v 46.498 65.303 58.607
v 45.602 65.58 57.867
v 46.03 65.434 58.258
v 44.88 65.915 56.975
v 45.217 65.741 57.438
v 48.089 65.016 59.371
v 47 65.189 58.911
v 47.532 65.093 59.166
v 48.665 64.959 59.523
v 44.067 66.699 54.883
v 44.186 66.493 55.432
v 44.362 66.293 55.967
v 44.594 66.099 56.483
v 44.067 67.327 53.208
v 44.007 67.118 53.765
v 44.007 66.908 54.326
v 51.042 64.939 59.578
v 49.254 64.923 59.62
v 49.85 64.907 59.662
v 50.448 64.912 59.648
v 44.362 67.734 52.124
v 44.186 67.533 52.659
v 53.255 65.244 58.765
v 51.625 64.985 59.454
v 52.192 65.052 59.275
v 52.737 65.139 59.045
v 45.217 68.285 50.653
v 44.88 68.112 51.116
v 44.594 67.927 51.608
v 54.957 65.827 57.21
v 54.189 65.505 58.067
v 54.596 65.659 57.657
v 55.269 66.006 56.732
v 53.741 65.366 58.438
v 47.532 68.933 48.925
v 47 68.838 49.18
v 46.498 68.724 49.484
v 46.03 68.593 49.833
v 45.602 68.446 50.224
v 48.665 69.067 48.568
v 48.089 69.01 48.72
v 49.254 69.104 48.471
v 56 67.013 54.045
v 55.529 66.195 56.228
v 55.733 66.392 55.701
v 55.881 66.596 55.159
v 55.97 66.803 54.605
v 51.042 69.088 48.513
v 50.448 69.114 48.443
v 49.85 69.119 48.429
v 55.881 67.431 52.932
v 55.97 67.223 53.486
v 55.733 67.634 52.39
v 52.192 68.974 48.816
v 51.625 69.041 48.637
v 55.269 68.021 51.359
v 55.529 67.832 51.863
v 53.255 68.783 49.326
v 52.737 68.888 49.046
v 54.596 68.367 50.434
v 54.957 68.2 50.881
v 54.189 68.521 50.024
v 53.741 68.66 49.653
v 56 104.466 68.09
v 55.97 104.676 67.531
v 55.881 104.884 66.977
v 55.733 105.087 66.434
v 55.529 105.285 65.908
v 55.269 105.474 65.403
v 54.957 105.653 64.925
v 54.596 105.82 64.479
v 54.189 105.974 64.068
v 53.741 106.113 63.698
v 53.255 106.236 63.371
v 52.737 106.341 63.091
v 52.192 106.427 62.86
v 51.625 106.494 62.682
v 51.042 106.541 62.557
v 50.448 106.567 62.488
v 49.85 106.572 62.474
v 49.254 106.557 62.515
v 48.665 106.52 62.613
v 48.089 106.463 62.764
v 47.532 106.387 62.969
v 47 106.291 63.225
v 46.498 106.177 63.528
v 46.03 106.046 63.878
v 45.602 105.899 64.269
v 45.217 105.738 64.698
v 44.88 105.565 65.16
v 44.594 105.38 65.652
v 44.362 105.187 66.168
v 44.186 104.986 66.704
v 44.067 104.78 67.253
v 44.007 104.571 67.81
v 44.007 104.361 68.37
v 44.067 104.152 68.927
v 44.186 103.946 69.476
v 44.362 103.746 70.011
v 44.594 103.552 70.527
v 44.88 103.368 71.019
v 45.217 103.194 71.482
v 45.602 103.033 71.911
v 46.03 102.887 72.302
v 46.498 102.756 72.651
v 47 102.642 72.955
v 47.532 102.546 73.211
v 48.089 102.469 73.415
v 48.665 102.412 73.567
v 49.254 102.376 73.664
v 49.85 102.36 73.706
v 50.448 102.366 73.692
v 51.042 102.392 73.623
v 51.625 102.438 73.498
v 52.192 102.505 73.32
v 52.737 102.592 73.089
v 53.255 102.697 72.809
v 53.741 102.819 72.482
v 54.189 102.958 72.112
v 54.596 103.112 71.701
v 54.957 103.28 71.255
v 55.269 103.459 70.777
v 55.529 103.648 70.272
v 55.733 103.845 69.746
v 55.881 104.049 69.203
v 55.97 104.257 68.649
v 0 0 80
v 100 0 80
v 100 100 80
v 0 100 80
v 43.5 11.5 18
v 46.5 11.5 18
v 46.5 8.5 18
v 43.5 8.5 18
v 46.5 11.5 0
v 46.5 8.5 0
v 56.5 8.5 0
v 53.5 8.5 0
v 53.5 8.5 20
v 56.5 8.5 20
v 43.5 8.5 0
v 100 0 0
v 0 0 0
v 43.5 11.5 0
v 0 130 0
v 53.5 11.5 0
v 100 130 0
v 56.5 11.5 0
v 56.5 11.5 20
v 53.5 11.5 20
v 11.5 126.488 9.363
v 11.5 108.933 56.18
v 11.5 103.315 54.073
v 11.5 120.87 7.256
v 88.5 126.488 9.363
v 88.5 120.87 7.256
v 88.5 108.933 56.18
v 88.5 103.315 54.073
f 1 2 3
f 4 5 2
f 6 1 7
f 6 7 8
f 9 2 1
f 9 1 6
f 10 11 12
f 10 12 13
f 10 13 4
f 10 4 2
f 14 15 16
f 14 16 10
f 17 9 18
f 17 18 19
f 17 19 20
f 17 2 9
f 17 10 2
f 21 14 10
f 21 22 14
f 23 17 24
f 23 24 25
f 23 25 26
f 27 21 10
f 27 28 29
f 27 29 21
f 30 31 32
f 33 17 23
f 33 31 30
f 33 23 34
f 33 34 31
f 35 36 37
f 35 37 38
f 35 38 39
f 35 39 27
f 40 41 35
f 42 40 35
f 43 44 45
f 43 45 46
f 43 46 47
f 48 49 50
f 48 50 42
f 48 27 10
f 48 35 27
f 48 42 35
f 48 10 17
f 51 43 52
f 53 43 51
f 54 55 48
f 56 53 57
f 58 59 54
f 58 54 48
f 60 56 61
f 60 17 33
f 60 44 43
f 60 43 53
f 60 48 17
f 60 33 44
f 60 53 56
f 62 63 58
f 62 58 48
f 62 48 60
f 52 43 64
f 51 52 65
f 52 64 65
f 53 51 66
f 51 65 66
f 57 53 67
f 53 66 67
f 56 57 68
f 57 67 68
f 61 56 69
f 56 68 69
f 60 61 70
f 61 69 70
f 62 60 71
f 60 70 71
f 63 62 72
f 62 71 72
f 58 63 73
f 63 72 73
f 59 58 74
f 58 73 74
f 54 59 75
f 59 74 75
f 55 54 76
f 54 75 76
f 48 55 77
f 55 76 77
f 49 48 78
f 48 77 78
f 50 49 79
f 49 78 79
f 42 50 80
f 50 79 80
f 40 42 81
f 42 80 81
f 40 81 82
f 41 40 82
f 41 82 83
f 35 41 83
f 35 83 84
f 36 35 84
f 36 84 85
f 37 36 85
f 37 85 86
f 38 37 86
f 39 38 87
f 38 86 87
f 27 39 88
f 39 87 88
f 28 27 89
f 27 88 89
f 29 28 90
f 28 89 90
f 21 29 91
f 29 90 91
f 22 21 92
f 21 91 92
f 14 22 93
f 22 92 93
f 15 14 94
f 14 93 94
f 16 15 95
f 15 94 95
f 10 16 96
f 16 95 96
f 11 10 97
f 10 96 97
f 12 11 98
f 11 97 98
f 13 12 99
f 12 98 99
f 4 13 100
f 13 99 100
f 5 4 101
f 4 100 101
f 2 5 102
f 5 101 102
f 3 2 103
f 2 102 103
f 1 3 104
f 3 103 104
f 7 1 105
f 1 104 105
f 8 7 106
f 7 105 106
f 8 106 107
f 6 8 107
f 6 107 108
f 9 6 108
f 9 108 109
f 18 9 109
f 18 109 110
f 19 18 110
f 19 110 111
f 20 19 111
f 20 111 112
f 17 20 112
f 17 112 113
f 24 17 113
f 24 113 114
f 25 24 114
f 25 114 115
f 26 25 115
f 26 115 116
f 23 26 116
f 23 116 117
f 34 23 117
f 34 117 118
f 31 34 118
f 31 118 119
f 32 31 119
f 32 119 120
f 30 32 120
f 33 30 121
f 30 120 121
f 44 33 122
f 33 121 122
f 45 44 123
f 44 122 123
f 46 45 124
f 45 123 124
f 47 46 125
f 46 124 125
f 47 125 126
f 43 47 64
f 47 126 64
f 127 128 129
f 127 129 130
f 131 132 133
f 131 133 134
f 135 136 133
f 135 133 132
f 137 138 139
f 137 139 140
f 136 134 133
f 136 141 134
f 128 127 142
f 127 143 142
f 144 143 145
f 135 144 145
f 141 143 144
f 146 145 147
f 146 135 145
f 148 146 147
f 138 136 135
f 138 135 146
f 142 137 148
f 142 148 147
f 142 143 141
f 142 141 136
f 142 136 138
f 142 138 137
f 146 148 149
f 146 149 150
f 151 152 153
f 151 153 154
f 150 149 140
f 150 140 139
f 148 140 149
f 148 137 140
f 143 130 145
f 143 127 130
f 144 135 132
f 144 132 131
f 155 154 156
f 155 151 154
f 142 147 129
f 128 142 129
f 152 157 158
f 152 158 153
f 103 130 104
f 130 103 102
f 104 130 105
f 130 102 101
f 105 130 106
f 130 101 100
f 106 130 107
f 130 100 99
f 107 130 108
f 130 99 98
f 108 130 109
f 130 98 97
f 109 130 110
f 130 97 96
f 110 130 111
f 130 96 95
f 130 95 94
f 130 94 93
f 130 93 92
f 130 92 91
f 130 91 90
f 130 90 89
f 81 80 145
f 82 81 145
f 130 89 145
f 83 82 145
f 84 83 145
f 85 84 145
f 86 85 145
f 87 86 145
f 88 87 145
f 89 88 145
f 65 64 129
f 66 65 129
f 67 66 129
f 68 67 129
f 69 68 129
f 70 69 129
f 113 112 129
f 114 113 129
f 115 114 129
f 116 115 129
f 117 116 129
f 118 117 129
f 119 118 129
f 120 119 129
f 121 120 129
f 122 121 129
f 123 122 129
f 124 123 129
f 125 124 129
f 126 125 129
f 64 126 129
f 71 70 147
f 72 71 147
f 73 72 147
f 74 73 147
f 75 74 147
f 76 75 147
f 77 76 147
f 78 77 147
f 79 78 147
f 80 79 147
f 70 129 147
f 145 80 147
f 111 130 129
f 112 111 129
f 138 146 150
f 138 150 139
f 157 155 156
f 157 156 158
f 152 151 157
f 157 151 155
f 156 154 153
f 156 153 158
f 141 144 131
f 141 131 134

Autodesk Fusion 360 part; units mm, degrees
sketch "Sketch1" plane through (0, 0, 0) normal (0, 1, 0) x (1, 0, 0)
  line L0 (0, 0) -> (100, 0)
  line L1 (100, 0) -> (100, -80)
  line L2 (100, -80) -> (0, -80)
  line L3 (0, -80) -> (0, 0)
  dimension "d1" = 100
  dimension "d2" = 80
extrude "Extrude1" add sketch "Sketch1" along normal blind 130
sketch "Sketch2" plane through (100, 0, 0) normal (1, 0, 0) x (0, 0, -1)
  line L0 (-80, 0) -> (0, 0)
  line L1 (0, 0) -> (0, 130)
  line L2 (0, 130) -> (-80, 130)
  line L3 (-80, 130) -> (-80, 0)
  line L4 (-80, 130) -> (-80, 100)
  line L5 (-80, 100) -> (0, 130)
extrude "Extrude2" cut sketch "Sketch2" against normal blind 130 contours L2 L3 L4 L5
sketch "Sketch3" plane through (0, 113.9726, 42.7397) normal (0, 0.9363, 0.3511) x (1, 0, 0)
  line L0 (0, 45.646) -> (0, -39.794)
  line L1 (0, -39.794) -> (100, -39.794)
  line L2 (100, -39.794) -> (100, 45.646)
  line L3 (100, 45.646) -> (0, 45.646)
  line L4 (11.5, 35.646) -> (88.5, 35.646)
  line L5 (88.5, 35.646) -> (88.5, -14.354)
  line L6 (88.5, -14.354) -> (11.5, -14.354)
  line L7 (11.5, -14.354) -> (11.5, 35.646)
  circle A0 centre (50, -27.074) radius 6
  dimension "d7" = 50
  dimension "d8" = 77
  dimension "d9" = 11.5
  dimension "d10" = 19.8322
  dimension "d11" = 10
  dimension "d12" = 25.44
  dimension "d13" = 12.72
  dimension "d14" = 50
  dimension "d15" = 12
extrude "Extrude4" cut sketch "Sketch3" against normal blind 40 contours A0
extrude "Extrude3" cut sketch "Sketch3" against normal blind 6 contours L4 L5 L6 L7
sketch "Sketch4" plane through (0, 0, 0) normal (0, 0, -1) x (-1, 0, 0)
  line L0 (-100, 0) -> (0, 0)
  line L1 (0, 0) -> (0, 130)
  line L2 (0, 130) -> (-100, 130)
  line L3 (-100, 130) -> (-100, 0)
  line L4 (-56.5, 11.5) -> (-53.5, 11.5)
  line L5 (-53.5, 11.5) -> (-53.5, 8.5)
  line L6 (-53.5, 8.5) -> (-56.5, 8.5)
  line L7 (-56.5, 8.5) -> (-56.5, 11.5)
  line L8 (-56.5, 11.5) -> (-53.5, 8.5) construction
  line L9 (-53.5, 11.5) -> (-56.5, 8.5) construction
  line L10 (-46.5, 11.5) -> (-43.5, 11.5)
  line L11 (-43.5, 11.5) -> (-43.5, 8.5)
  line L12 (-43.5, 8.5) -> (-46.5, 8.5)
  line L13 (-46.5, 8.5) -> (-46.5, 11.5)
  line L14 (-46.5, 11.5) -> (-43.5, 8.5) construction
  line L15 (-43.5, 11.5) -> (-46.5, 8.5) construction
  dimension "d20" = 10
  dimension "d21" = 10
  dimension "d22" = 3
  dimension "d23" = 3
  dimension "d24" = 3
  dimension "d25" = 3
  dimension "d30" = 45
extrude "Extrude7" cut sketch "Sketch4" against normal blind 20 contours L4 L5 L6 L7
extrude "Extrude5" cut sketch "Sketch4" against normal blind 14 contours L4 L5 L6 L7
extrude "Extrude6" cut sketch "Sketch4" against normal blind 18 contours L10 L11 L12 L13
equation "d13 = ( 25.44 / 2 ) * 1 mm"
